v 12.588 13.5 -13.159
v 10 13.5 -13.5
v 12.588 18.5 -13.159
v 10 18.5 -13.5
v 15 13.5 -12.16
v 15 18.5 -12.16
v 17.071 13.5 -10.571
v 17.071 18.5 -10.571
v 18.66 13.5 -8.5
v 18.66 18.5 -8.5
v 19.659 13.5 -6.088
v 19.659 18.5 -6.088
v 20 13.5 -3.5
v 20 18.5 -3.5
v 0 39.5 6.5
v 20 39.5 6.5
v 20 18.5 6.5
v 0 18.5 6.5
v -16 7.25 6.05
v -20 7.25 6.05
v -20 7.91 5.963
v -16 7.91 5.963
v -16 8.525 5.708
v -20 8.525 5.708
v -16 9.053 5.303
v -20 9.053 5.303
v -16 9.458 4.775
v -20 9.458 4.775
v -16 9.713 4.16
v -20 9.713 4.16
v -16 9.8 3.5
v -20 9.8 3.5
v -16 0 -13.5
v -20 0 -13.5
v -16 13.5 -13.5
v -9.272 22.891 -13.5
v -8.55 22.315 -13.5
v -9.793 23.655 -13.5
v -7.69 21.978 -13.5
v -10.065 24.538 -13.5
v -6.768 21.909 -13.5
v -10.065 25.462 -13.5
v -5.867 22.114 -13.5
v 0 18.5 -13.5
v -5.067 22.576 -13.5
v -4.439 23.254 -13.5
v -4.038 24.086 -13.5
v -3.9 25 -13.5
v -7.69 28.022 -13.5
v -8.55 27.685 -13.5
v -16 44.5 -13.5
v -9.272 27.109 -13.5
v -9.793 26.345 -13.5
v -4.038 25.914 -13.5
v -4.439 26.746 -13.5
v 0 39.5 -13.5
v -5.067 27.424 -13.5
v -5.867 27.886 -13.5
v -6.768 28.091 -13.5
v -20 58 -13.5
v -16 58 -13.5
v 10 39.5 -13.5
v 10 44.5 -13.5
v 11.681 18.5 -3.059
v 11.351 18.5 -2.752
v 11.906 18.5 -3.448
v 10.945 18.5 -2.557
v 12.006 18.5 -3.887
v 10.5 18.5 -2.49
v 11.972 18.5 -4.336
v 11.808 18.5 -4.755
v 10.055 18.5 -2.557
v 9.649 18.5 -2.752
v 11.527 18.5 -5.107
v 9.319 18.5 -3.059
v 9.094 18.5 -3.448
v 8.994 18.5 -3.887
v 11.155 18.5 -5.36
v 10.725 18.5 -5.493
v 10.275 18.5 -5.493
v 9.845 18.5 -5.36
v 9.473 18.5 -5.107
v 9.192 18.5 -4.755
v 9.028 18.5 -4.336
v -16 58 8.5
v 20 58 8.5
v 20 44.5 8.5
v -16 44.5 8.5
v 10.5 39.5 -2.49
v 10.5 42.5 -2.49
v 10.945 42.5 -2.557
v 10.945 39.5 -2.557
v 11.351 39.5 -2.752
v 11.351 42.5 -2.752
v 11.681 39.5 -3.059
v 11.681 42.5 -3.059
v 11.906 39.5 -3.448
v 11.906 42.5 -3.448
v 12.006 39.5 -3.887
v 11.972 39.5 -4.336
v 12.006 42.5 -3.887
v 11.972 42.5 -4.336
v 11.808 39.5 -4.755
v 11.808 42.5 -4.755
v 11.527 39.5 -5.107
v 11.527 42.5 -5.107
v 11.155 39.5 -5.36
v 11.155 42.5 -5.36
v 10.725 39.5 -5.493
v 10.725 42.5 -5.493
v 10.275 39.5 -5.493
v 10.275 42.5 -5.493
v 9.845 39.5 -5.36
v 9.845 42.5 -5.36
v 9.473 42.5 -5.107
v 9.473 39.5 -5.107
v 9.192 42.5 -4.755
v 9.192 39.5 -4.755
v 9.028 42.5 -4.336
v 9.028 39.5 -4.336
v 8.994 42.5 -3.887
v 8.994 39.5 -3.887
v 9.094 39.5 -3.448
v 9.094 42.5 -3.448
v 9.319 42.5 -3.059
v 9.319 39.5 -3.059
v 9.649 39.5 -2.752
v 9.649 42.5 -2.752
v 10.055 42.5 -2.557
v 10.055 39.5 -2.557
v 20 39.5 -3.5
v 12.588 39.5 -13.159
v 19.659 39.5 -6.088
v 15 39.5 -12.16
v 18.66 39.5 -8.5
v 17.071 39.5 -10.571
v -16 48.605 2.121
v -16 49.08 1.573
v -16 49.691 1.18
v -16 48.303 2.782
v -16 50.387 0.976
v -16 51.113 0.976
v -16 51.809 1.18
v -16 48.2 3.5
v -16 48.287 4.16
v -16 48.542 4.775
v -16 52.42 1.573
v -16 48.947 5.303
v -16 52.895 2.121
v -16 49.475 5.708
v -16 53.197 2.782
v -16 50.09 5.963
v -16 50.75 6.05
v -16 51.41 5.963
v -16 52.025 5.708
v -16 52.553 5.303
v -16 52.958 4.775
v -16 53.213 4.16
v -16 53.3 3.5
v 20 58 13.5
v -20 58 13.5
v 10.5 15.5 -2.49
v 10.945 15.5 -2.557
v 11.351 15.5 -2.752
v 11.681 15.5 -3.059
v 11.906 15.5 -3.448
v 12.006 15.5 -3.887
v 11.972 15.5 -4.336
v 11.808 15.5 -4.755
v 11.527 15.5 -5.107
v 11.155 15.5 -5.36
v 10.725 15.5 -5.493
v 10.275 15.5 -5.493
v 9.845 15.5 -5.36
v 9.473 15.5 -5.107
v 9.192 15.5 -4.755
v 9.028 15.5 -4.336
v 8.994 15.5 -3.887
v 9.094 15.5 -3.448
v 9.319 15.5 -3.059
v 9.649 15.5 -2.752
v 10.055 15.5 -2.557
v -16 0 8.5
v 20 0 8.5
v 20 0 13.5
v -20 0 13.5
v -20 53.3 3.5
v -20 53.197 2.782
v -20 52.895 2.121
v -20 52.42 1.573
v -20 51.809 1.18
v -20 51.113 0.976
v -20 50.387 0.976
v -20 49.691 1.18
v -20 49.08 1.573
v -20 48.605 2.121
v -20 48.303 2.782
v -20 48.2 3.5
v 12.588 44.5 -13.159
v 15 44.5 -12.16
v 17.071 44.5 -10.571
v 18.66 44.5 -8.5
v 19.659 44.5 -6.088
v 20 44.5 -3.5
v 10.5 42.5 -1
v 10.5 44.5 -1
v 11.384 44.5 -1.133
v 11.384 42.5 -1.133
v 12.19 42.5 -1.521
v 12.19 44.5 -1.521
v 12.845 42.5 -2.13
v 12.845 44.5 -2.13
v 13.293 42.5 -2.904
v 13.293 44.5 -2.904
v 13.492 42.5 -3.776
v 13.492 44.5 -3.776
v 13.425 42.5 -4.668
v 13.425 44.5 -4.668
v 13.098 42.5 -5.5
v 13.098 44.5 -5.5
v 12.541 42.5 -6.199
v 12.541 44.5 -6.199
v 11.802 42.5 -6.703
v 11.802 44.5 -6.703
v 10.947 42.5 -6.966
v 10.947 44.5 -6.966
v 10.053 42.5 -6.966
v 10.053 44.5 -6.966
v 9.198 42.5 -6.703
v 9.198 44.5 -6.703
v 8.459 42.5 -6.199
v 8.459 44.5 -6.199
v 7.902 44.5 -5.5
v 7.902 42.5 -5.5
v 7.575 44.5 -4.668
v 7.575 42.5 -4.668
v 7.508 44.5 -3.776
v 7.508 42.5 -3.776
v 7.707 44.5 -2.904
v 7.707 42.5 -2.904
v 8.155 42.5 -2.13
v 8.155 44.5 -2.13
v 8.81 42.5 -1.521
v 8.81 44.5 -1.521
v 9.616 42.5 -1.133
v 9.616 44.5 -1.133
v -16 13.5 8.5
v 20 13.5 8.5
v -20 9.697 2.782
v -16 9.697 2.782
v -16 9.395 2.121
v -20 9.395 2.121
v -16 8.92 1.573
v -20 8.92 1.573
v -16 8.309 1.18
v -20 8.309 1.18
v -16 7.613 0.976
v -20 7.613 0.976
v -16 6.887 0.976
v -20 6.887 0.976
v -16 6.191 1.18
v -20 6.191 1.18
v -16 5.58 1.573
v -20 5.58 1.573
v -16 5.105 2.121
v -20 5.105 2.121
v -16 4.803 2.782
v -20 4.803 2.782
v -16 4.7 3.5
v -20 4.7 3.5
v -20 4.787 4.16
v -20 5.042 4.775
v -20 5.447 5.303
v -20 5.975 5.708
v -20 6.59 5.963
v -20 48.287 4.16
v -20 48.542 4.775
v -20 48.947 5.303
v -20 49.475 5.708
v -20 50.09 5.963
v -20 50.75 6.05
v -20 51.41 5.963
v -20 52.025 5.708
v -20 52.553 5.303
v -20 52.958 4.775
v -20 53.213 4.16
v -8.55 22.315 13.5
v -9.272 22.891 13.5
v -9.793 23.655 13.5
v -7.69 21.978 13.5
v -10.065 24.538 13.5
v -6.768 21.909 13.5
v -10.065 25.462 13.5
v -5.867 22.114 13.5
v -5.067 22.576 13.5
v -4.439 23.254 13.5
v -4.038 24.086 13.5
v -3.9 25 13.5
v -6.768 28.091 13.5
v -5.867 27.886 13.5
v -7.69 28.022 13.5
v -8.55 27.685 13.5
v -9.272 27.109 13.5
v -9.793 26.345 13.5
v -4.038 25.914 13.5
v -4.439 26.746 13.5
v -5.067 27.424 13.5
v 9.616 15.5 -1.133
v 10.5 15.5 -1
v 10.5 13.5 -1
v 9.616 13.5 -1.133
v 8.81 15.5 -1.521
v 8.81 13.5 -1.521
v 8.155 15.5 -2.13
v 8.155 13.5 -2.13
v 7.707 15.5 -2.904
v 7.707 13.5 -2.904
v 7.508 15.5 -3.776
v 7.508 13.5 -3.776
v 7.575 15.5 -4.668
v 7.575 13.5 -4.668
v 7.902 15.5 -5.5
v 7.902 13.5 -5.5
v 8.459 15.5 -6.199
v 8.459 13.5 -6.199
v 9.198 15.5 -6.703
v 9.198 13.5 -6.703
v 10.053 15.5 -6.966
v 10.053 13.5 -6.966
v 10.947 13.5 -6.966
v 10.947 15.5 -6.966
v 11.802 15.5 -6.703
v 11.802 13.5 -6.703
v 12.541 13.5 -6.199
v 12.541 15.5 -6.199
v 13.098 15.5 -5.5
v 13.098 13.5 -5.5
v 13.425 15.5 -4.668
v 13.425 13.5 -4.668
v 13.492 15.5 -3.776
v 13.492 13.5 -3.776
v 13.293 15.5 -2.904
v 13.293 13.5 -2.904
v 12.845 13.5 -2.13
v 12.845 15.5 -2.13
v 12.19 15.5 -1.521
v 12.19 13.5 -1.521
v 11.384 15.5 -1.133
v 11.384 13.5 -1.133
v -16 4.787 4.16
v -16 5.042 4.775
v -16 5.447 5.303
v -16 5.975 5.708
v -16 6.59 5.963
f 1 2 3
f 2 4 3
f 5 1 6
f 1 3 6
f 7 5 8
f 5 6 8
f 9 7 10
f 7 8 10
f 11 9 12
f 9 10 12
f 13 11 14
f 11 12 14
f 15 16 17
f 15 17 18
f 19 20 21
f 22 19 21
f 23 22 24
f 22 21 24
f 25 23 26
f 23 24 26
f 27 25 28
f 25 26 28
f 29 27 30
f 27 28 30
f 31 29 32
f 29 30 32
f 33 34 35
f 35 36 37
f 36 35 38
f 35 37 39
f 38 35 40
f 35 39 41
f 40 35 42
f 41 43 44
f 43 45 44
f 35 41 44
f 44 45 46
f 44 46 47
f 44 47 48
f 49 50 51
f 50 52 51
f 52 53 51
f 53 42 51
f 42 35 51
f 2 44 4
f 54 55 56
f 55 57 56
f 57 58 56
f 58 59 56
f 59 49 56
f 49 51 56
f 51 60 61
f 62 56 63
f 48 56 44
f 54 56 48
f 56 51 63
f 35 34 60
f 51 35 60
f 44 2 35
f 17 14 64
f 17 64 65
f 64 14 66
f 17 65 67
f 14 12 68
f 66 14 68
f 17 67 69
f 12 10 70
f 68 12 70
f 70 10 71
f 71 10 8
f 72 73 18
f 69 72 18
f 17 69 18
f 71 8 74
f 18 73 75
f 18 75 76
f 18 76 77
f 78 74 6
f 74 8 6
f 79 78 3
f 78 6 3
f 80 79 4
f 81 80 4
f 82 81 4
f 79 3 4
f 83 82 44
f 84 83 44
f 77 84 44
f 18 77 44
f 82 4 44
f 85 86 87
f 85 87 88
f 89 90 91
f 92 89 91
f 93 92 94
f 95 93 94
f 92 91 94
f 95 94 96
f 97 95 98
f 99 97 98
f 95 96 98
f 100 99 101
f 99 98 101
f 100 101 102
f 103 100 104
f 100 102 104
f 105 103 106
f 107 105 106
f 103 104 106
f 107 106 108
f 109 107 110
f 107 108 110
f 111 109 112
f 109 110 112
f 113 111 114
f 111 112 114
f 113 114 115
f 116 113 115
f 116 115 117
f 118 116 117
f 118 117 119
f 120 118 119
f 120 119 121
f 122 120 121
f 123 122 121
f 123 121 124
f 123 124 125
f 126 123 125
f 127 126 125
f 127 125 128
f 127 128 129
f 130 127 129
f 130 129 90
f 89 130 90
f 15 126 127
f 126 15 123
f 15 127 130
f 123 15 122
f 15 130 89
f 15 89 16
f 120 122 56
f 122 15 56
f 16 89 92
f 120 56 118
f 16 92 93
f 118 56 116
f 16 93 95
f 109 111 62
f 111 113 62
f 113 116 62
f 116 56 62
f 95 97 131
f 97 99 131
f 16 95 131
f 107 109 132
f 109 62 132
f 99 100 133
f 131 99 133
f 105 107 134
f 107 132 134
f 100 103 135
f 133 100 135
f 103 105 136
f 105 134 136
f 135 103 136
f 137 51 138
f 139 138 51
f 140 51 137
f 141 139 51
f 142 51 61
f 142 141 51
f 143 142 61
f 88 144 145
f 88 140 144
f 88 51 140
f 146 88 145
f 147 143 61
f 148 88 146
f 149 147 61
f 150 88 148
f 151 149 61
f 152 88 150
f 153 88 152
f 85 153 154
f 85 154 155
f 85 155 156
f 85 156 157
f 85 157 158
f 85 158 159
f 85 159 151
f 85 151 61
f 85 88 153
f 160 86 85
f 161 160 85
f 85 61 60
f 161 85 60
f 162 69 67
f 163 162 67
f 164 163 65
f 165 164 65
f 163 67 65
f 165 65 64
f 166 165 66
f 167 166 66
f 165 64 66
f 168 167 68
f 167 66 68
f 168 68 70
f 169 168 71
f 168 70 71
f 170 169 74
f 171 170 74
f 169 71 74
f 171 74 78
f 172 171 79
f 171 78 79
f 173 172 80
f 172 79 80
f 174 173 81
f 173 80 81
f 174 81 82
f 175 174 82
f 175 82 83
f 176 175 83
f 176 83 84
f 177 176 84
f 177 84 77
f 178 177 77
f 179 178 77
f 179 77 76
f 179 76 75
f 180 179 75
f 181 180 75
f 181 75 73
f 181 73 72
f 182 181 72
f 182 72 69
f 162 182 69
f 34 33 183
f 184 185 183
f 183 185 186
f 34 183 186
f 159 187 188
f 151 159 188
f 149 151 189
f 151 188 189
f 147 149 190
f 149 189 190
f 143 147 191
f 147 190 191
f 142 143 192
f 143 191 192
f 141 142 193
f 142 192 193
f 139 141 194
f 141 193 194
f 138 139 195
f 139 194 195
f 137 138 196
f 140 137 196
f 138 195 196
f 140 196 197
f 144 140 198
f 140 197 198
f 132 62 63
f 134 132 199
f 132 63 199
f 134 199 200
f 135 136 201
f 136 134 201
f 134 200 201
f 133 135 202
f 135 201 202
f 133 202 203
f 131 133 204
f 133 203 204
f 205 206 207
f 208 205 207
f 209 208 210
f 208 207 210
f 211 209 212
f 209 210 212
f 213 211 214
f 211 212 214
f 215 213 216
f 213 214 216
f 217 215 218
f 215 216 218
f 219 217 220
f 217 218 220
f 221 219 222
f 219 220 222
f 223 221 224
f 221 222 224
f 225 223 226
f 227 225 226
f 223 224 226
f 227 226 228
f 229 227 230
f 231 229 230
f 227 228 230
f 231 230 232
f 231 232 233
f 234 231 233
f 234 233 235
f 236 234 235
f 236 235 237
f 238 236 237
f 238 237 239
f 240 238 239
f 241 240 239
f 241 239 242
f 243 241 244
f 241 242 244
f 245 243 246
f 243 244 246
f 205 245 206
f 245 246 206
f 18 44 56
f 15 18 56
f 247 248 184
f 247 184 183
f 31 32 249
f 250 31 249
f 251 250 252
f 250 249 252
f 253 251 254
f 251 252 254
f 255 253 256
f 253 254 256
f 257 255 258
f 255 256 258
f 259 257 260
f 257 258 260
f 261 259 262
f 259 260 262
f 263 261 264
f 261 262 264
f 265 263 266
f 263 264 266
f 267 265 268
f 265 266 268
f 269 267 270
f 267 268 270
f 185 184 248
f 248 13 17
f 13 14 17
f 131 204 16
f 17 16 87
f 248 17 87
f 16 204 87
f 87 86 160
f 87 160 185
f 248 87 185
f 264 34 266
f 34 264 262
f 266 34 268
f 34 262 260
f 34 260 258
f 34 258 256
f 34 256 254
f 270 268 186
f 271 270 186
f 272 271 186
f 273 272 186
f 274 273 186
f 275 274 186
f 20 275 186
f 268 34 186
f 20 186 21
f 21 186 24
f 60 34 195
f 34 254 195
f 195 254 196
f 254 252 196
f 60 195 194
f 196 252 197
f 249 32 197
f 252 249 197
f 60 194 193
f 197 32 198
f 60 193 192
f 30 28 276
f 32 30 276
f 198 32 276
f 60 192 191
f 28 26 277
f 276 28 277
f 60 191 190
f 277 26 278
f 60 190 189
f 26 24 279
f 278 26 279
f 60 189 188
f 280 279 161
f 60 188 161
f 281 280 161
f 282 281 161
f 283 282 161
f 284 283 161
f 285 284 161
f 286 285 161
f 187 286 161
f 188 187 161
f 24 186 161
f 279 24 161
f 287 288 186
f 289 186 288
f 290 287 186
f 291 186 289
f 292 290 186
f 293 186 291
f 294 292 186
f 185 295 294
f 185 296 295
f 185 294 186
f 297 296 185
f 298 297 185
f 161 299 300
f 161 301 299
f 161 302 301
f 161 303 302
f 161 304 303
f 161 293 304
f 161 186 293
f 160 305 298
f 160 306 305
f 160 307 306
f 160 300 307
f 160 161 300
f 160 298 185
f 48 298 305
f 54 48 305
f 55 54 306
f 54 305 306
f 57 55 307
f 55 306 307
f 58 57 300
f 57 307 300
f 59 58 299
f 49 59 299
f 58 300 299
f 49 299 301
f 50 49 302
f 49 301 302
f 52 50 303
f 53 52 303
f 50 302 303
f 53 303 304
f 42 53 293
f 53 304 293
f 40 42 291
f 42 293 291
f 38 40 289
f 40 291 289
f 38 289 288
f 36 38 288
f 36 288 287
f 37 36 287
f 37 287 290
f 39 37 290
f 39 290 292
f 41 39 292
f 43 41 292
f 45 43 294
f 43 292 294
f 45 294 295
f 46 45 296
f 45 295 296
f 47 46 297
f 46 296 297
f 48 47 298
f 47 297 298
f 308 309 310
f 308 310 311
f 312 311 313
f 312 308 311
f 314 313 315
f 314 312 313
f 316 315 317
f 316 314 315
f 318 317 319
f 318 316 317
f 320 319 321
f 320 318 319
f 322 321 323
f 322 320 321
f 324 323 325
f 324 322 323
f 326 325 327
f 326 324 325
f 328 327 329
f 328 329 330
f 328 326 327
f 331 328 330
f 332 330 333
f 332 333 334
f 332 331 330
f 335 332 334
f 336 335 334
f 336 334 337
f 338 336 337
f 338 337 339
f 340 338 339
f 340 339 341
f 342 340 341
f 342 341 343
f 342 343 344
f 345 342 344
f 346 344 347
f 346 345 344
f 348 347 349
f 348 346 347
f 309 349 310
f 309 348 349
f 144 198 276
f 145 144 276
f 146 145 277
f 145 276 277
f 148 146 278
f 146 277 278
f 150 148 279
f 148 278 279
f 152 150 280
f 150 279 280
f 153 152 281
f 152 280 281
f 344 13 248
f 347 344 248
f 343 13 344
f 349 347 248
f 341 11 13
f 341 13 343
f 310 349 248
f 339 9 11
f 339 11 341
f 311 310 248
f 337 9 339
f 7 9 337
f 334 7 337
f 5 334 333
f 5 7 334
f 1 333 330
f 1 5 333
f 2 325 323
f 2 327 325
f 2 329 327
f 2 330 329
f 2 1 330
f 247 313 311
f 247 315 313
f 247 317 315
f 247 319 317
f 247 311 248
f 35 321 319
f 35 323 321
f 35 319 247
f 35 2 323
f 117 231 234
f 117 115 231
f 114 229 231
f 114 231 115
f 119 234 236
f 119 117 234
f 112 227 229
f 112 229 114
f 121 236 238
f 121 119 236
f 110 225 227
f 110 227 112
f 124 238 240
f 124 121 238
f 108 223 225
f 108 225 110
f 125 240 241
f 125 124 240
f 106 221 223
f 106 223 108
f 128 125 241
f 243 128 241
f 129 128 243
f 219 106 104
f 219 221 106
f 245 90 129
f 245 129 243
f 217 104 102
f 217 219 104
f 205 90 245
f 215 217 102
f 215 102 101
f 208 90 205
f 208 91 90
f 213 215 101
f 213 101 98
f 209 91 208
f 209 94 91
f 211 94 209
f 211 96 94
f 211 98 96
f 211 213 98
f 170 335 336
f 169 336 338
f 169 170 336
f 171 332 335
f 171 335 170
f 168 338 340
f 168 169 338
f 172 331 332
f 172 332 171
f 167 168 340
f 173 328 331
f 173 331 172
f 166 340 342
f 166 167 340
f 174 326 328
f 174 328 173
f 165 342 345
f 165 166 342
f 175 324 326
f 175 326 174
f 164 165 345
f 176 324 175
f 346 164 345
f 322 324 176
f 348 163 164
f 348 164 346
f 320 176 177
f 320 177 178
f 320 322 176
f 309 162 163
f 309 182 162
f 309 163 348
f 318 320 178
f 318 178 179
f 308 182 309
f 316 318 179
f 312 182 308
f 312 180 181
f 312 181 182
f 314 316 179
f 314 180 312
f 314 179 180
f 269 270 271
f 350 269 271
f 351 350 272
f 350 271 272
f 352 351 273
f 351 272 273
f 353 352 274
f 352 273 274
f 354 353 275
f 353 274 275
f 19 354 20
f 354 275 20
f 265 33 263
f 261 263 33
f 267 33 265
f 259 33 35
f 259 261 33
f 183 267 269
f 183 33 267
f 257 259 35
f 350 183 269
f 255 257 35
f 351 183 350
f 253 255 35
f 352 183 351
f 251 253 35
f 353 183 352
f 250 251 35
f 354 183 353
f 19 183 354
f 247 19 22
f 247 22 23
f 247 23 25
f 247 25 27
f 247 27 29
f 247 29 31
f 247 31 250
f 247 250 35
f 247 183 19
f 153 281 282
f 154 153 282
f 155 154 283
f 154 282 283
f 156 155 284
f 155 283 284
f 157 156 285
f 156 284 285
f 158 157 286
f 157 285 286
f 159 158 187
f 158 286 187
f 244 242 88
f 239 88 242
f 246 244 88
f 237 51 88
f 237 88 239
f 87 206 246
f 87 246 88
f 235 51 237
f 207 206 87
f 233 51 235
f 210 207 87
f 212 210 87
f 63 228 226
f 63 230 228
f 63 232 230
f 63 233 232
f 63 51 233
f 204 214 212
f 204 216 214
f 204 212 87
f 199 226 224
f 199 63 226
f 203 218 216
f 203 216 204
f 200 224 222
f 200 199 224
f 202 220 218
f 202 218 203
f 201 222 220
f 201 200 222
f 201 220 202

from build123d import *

# Parameters (mm, degrees)
EXTRUDE_1_DEPTH      = 58
SKETCH_2_R           = 3
CUT_EXTRUDE_1_DEPTH  = 58
SKETCH_3_W           = 15
SKETCH_3_H           = 14.5
SKETCH_3_W_2         = 25
CUT_EXTRUDE_2_DEPTH  = 22
SKETCH_5_W           = 4
SKETCH_5_H           = 14.5
EXTRUDE_2_DEPTH      = 22
CUT_EXTRUDE_3_DEPTH  = 22
CUT_EXTRUDE_START    = -30
CUT_EXTRUDE_4_DEPTH  = 30
EXTRUDE_START        = -4
EXTRUDE_5_DEPTH      = 4
EXTRUDE_6_DEPTH      = 4
SKETCH_18_R          = 3.05
CUT_EXTRUDE_7_DEPTH  = 50
SKETCH_17_R          = 1.51
CUT_EXTRUDE_8_DEPTH  = 50
EXTRUDE_7_DEPTH      = 4
EXTRUDE_START_2      = 1
SKETCH_20_R          = 1.51
EXTRUDE_8_DEPTH      = 1
SKETCH_21_R          = 3
SKETCH_21_R_2        = 1.51
CUT_EXTRUDE_9_DEPTH  = 2
EXTRUDE_9_DEPTH      = 4
SKETCH_23_R          = 1.51
EXTRUDE_10_DEPTH     = 1
CUT_EXTRUDE_START_2  = -2
SKETCH_24_R          = 3
CUT_EXTRUDE_10_DEPTH = 2
CUT_EXTRUDE_11_DEPTH = 100
SKETCH_26_R          = 3.05
EXTRUDE_11_DEPTH     = 27
SKETCH_27_R          = 3.1
CUT_EXTRUDE_12_DEPTH = 27
SKETCH_29_W          = 20
SKETCH_29_H          = 21
CUT_EXTRUDE_13_DEPTH = 20
EXTRUDE_START_3      = -5
SKETCH_30_R          = 3
EXTRUDE_12_DEPTH     = 5
SKETCH_32_R          = 3
EXTRUDE_13_DEPTH     = 5
SKETCH_34_R          = 1.51
CUT_EXTRUDE_14_DEPTH = 100
SKETCH_35_R          = 3
CUT_EXTRUDE_15_DEPTH = 2
SKETCH_36_R          = 3
CUT_EXTRUDE_16_DEPTH = 2


with BuildPart() as part:
    # 草图1 → 凸台-拉伸1 (new body)
    with BuildSketch(Plane(origin=(0, 0, 0), x_dir=(1, 0, 0), z_dir=(0, 1, 0))):
        with BuildLine():
            Line((-20, 13.5), (5, 13.5))
            ThreePointArc((5, 13.5), (15.606601718, 9.106601718), (20, -1.5))
            Line((20, -1.5), (20, -13.5))
            Line((20, -13.5), (-20, -13.5))
            Line((-20, -13.5), (-20, 13.5))
        make_face()
    extrude(amount=EXTRUDE_1_DEPTH)

    # 草图2 → 切除-拉伸1 (cut)
    with BuildSketch(Plane.XY.offset(13.5)):
        with Locations((-7, 33)):
            Circle(SKETCH_2_R)
    extrude(amount=-CUT_EXTRUDE_1_DEPTH, mode=Mode.SUBTRACT)

    # 草图3 → 切除-拉伸2 (cut)
    with BuildSketch(Plane(origin=(0, 0, -13.5), x_dir=(-1, 0, 0), z_dir=(0, 0, -1))):
        with Locations((-12.5, 50.75)):
            Rectangle(SKETCH_3_W, SKETCH_3_H)
        with Locations((-12.5, 7.25)):
            Rectangle(SKETCH_3_W, SKETCH_3_H)
        with Locations((7.5, 7.25)):
            Rectangle(SKETCH_3_W_2, SKETCH_3_H)
        with Locations((7.5, 50.75)):
            Rectangle(SKETCH_3_W_2, SKETCH_3_H)
    extrude(amount=-CUT_EXTRUDE_2_DEPTH, mode=Mode.SUBTRACT)

    # 草图5 → 凸台-拉伸2 (add)
    with BuildSketch(Plane(origin=(0, 0, 8.5), x_dir=(-1, 0, 0), z_dir=(0, 0, -1))):
        with Locations((18, 7.25)):
            Rectangle(SKETCH_5_W, SKETCH_5_H)
        with Locations((18, 50.75)):
            Rectangle(SKETCH_5_W, SKETCH_5_H)
    extrude(amount=EXTRUDE_2_DEPTH)

    # 草图8 → 切除-拉伸3 (cut)
    with BuildSketch(Plane.ZY.offset(20)):
        with BuildLine():
            ThreePointArc((6.05, 50.75), (5.303122292, 52.553122292), (3.5, 53.3))
            Line((3.5, 53.3), (3.5, 48.2))
            ThreePointArc((3.5, 48.2), (5.303122292, 48.946877708), (6.05, 50.75))
        make_face()
        with BuildLine():
            Line((3.5, 48.2), (3.5, 53.3))
            ThreePointArc((3.5, 53.3), (0.95, 50.75), (3.5, 48.2))
        make_face()
        with BuildLine():
            ThreePointArc((3.5, 9.8), (0.95, 7.25), (3.5, 4.7))
            Line((3.5, 4.7), (3.5, 9.8))
        make_face()
        with BuildLine():
            Line((3.5, 9.8), (3.5, 4.7))
            ThreePointArc((3.5, 4.7), (5.303122292, 5.446877708), (6.05, 7.25))
            ThreePointArc((6.05, 7.25), (5.303122292, 9.053122292), (3.5, 9.8))
        make_face()
    extrude(amount=-CUT_EXTRUDE_3_DEPTH, mode=Mode.SUBTRACT)

    # 草图10 → 切除-拉伸4 (cut)
    with BuildSketch(Plane(origin=(0, 43.5, 0), x_dir=(1, 0, 0), z_dir=(0, 1, 0)).offset(CUT_EXTRUDE_START)):
        with BuildLine():
            Line((20, -6.5), (20, -1.5))
            ThreePointArc((20, -1.5), (15.606601718, 9.106601718), (5, 13.5))
            Line((5, 13.5), (0, 13.5))
            ThreePointArc((0, 13.5), (5.857864376, -0.642135624), (20, -6.5))
        make_face()
        with BuildLine():
            Line((20, -1.5), (20, 13.5))
            Line((20, 13.5), (5, 13.5))
            ThreePointArc((5, 13.5), (15.606601718, 9.106601718), (20, -1.5))
        make_face()
    extrude(amount=CUT_EXTRUDE_4_DEPTH, mode=Mode.SUBTRACT)

    # 草图11 → 凸台-拉伸5 (add)
    with BuildSketch(Plane(origin=(0, 43.5, 0), x_dir=(1, 0, 0), z_dir=(0, 1, 0)).offset(EXTRUDE_START)):
        with BuildLine():
            Line((5, 13.5), (0, 13.5))
            ThreePointArc((0, 13.5), (5.857864376, -0.642135624), (20, -6.5))
            Line((20, -6.5), (20, -1.5))
            ThreePointArc((20, -1.5), (15.606601718, 9.106601718), (5, 13.5))
        make_face()
    extrude(amount=EXTRUDE_5_DEPTH)

    # 草图13 → 凸台-拉伸6 (add)
    with BuildSketch(Plane.XZ.offset(-14.5)):
        with BuildLine():
            Line((0, -13.5), (5, -13.5))
            ThreePointArc((5, -13.5), (15.606601718, -9.106601718), (20, 1.5))
            Line((20, 1.5), (20, 6.5))
            ThreePointArc((20, 6.5), (5.857864376, 0.642135624), (0, -13.5))
        make_face()
    extrude(amount=-EXTRUDE_6_DEPTH)

    # 草图18 → 切除-拉伸7 (cut)
    with BuildSketch(Plane.XY.offset(13.5)):
        with Locations((-7, 33)):
            Circle(SKETCH_18_R)
    extrude(amount=-CUT_EXTRUDE_7_DEPTH, mode=Mode.SUBTRACT)

    # 草图17 → 切除-拉伸8 (cut)
    with BuildSketch(Plane(origin=(0, 43.5, 0), x_dir=(1, 0, 0), z_dir=(0, 1, 0))):
        with Locations(Location((12.928932188, 6.428932188, 0), (0, 0, 270))):
            Circle(SKETCH_17_R)
    extrude(amount=-CUT_EXTRUDE_8_DEPTH, mode=Mode.SUBTRACT)

    # 草图19 → 凸台-拉伸7 (add)
    with BuildSketch(Plane(origin=(0, 43.5, 0), x_dir=(1, 0, 0), z_dir=(0, 1, 0)).offset(EXTRUDE_START)):
        with BuildLine():
            Line((10, 13.5), (5, 13.5))
            ThreePointArc((5, 13.5), (15.606601718, 9.106601718), (20, -1.5))
            Line((20, -1.5), (20, 3.5))
            ThreePointArc((20, 3.5), (17.071067812, 10.571067812), (10, 13.5))
        make_face()
    extrude(amount=EXTRUDE_7_DEPTH)

    # 草图20 → 凸台-拉伸8 (add)
    with BuildSketch(Plane(origin=(0, 43.5, 0), x_dir=(1, 0, 0), z_dir=(0, 1, 0)).offset(EXTRUDE_START_2)):
        with BuildLine():
            Line((20, 3.5), (20, -8.5))
            Line((20, -8.5), (-16, -8.5))
            Line((-16, -8.5), (-16, 13.5))
            Line((-16, 13.5), (10, 13.5))
            ThreePointArc((10, 13.5), (17.071067812, 10.571067812), (20, 3.5))
        make_face()
        with Locations(Location((12.928932188, 6.428932188, 0), (0, 0, 270))):
            Circle(SKETCH_20_R, mode=Mode.SUBTRACT)
    extrude(amount=-EXTRUDE_8_DEPTH)

    # 草图21 → 切除-拉伸9 (cut)
    with BuildSketch(Plane(origin=(0, 44.5, 0), x_dir=(1, 0, 0), z_dir=(0, 1, 0))):
        with Locations(Location((12.928932188, 6.428932188, 0), (0, 0, 270))):
            Circle(SKETCH_21_R)
        with Locations(Location((12.928932188, 6.428932188, 0), (0, 0, 270))):
            Circle(SKETCH_21_R_2, mode=Mode.SUBTRACT)
    extrude(amount=-CUT_EXTRUDE_9_DEPTH, mode=Mode.SUBTRACT)

    # 草图22 → 凸台-拉伸9 (add)
    with BuildSketch(Plane(origin=(0, 14.5, 0), x_dir=(-1, 0, 0), z_dir=(0, -1, 0))):
        with BuildLine():
            Line((-5, 13.5), (-10, 13.5))
            ThreePointArc((-10, 13.5), (-17.071067812, 10.571067812), (-20, 3.5))
            Line((-20, 3.5), (-20, -1.5))
            ThreePointArc((-20, -1.5), (-15.606601718, 9.106601718), (-5, 13.5))
        make_face()
    extrude(amount=-EXTRUDE_9_DEPTH)

    # 草图23 → 凸台-拉伸10 (add)
    with BuildSketch(Plane(origin=(0, 14.5, 0), x_dir=(-1, 0, 0), z_dir=(0, -1, 0))):
        with BuildLine():
            Line((16, -8.5), (16, 13.5))
            Line((16, 13.5), (-10, 13.5))
            ThreePointArc((-10, 13.5), (-17.071067812, 10.571067812), (-20, 3.5))
            Line((-20, 3.5), (-20, -8.5))
            Line((-20, -8.5), (16, -8.5))
        make_face()
        with Locations(Location((-12.928932188, 6.428932188, 0), (0, 0, 270))):
            Circle(SKETCH_23_R, mode=Mode.SUBTRACT)
    extrude(amount=EXTRUDE_10_DEPTH)

    # 草图24 → 切除-拉伸10 (cut)
    with BuildSketch(Plane(origin=(0, 13.5, 0), x_dir=(-1, 0, 0), z_dir=(0, -1, 0)).offset(CUT_EXTRUDE_START_2)):
        with Locations(Location((-12.928932188, 6.428932188, 0), (0, 0, 270))):
            Circle(SKETCH_24_R)
    extrude(amount=CUT_EXTRUDE_10_DEPTH, mode=Mode.SUBTRACT)

    # 草图25 → 切除-拉伸11 (cut)
    with BuildSketch(Plane.XY.offset(13.5)):
        with BuildLine():
            ThreePointArc((-3.95, 25), (-4.843324317, 27.156675683), (-7, 28.05))
            Line((-7, 28.05), (-7, 21.95))
            ThreePointArc((-7, 21.95), (-4.843324317, 22.843324317), (-3.95, 25))
        make_face()
        with BuildLine():
            Line((-7, 21.95), (-7, 28.05))
            ThreePointArc((-7, 28.05), (-10.05, 25), (-7, 21.95))
        make_face()
    extrude(amount=-CUT_EXTRUDE_11_DEPTH, mode=Mode.SUBTRACT)

    # 草图26 → 凸台-拉伸11 (add)
    with BuildSketch(Plane.XY.offset(13.5)):
        with Locations((-7, 33)):
            Circle(SKETCH_26_R)
    extrude(amount=-EXTRUDE_11_DEPTH)

    # 草图27 → 切除-拉伸12 (cut)
    with BuildSketch(Plane.XY.offset(13.5)):
        with Locations((-7, 25)):
            Circle(SKETCH_27_R)
    extrude(amount=-CUT_EXTRUDE_12_DEPTH, mode=Mode.SUBTRACT)

    # 草图29 → 切除-拉伸13 (cut)
    with BuildSketch(Plane(origin=(0, 0, -13.5), x_dir=(-1, 0, 0), z_dir=(0, 0, -1))):
        with Locations((-10, 29)):
            Rectangle(SKETCH_29_W, SKETCH_29_H)
    extrude(amount=-CUT_EXTRUDE_13_DEPTH, mode=Mode.SUBTRACT)

    # 草图30 → 凸台-拉伸12 (add)
    with BuildSketch(Plane(origin=(0, 13.5, 0), x_dir=(-1, 0, 0), z_dir=(0, -1, 0)).offset(EXTRUDE_START_3)):
        with Locations(Location((-12.928932188, 6.428932188, 0), (0, 0, 270))):
            Circle(SKETCH_30_R)
    extrude(amount=EXTRUDE_12_DEPTH)

    # 草图32 → 凸台-拉伸13 (add)
    with BuildSketch(Plane(origin=(0, 44.5, 0), x_dir=(1, 0, 0), z_dir=(0, 1, 0))):
        with Locations((12.928932188, 6.428932188)):
            Circle(SKETCH_32_R)
    extrude(amount=-EXTRUDE_13_DEPTH)

    # 草图34 → 切除-拉伸14 (cut)
    with BuildSketch(Plane(origin=(0, 44.5, 0), x_dir=(1, 0, 0), z_dir=(0, 1, 0))):
        with Locations(Location((10.5, 4, 0), (0, 0, 270))):
            Circle(SKETCH_34_R)
    extrude(amount=-CUT_EXTRUDE_14_DEPTH, mode=Mode.SUBTRACT)

    # 草图35 → 切除-拉伸15 (cut)
    with BuildSketch(Plane(origin=(0, 44.5, 0), x_dir=(1, 0, 0), z_dir=(0, 1, 0))):
        with Locations(Location((10.5, 4, 0), (0, 0, 270))):
            Circle(SKETCH_35_R)
    extrude(amount=-CUT_EXTRUDE_15_DEPTH, mode=Mode.SUBTRACT)

    # 草图36 → 切除-拉伸16 (cut)
    with BuildSketch(Plane(origin=(0, 13.5, 0), x_dir=(-1, 0, 0), z_dir=(0, -1, 0)).offset(CUT_EXTRUDE_START_2)):
        with Locations(Location((-10.5, 4, 0), (0, 0, 270))):
            Circle(SKETCH_36_R)
    extrude(amount=CUT_EXTRUDE_16_DEPTH, mode=Mode.SUBTRACT)


solid = part.part
